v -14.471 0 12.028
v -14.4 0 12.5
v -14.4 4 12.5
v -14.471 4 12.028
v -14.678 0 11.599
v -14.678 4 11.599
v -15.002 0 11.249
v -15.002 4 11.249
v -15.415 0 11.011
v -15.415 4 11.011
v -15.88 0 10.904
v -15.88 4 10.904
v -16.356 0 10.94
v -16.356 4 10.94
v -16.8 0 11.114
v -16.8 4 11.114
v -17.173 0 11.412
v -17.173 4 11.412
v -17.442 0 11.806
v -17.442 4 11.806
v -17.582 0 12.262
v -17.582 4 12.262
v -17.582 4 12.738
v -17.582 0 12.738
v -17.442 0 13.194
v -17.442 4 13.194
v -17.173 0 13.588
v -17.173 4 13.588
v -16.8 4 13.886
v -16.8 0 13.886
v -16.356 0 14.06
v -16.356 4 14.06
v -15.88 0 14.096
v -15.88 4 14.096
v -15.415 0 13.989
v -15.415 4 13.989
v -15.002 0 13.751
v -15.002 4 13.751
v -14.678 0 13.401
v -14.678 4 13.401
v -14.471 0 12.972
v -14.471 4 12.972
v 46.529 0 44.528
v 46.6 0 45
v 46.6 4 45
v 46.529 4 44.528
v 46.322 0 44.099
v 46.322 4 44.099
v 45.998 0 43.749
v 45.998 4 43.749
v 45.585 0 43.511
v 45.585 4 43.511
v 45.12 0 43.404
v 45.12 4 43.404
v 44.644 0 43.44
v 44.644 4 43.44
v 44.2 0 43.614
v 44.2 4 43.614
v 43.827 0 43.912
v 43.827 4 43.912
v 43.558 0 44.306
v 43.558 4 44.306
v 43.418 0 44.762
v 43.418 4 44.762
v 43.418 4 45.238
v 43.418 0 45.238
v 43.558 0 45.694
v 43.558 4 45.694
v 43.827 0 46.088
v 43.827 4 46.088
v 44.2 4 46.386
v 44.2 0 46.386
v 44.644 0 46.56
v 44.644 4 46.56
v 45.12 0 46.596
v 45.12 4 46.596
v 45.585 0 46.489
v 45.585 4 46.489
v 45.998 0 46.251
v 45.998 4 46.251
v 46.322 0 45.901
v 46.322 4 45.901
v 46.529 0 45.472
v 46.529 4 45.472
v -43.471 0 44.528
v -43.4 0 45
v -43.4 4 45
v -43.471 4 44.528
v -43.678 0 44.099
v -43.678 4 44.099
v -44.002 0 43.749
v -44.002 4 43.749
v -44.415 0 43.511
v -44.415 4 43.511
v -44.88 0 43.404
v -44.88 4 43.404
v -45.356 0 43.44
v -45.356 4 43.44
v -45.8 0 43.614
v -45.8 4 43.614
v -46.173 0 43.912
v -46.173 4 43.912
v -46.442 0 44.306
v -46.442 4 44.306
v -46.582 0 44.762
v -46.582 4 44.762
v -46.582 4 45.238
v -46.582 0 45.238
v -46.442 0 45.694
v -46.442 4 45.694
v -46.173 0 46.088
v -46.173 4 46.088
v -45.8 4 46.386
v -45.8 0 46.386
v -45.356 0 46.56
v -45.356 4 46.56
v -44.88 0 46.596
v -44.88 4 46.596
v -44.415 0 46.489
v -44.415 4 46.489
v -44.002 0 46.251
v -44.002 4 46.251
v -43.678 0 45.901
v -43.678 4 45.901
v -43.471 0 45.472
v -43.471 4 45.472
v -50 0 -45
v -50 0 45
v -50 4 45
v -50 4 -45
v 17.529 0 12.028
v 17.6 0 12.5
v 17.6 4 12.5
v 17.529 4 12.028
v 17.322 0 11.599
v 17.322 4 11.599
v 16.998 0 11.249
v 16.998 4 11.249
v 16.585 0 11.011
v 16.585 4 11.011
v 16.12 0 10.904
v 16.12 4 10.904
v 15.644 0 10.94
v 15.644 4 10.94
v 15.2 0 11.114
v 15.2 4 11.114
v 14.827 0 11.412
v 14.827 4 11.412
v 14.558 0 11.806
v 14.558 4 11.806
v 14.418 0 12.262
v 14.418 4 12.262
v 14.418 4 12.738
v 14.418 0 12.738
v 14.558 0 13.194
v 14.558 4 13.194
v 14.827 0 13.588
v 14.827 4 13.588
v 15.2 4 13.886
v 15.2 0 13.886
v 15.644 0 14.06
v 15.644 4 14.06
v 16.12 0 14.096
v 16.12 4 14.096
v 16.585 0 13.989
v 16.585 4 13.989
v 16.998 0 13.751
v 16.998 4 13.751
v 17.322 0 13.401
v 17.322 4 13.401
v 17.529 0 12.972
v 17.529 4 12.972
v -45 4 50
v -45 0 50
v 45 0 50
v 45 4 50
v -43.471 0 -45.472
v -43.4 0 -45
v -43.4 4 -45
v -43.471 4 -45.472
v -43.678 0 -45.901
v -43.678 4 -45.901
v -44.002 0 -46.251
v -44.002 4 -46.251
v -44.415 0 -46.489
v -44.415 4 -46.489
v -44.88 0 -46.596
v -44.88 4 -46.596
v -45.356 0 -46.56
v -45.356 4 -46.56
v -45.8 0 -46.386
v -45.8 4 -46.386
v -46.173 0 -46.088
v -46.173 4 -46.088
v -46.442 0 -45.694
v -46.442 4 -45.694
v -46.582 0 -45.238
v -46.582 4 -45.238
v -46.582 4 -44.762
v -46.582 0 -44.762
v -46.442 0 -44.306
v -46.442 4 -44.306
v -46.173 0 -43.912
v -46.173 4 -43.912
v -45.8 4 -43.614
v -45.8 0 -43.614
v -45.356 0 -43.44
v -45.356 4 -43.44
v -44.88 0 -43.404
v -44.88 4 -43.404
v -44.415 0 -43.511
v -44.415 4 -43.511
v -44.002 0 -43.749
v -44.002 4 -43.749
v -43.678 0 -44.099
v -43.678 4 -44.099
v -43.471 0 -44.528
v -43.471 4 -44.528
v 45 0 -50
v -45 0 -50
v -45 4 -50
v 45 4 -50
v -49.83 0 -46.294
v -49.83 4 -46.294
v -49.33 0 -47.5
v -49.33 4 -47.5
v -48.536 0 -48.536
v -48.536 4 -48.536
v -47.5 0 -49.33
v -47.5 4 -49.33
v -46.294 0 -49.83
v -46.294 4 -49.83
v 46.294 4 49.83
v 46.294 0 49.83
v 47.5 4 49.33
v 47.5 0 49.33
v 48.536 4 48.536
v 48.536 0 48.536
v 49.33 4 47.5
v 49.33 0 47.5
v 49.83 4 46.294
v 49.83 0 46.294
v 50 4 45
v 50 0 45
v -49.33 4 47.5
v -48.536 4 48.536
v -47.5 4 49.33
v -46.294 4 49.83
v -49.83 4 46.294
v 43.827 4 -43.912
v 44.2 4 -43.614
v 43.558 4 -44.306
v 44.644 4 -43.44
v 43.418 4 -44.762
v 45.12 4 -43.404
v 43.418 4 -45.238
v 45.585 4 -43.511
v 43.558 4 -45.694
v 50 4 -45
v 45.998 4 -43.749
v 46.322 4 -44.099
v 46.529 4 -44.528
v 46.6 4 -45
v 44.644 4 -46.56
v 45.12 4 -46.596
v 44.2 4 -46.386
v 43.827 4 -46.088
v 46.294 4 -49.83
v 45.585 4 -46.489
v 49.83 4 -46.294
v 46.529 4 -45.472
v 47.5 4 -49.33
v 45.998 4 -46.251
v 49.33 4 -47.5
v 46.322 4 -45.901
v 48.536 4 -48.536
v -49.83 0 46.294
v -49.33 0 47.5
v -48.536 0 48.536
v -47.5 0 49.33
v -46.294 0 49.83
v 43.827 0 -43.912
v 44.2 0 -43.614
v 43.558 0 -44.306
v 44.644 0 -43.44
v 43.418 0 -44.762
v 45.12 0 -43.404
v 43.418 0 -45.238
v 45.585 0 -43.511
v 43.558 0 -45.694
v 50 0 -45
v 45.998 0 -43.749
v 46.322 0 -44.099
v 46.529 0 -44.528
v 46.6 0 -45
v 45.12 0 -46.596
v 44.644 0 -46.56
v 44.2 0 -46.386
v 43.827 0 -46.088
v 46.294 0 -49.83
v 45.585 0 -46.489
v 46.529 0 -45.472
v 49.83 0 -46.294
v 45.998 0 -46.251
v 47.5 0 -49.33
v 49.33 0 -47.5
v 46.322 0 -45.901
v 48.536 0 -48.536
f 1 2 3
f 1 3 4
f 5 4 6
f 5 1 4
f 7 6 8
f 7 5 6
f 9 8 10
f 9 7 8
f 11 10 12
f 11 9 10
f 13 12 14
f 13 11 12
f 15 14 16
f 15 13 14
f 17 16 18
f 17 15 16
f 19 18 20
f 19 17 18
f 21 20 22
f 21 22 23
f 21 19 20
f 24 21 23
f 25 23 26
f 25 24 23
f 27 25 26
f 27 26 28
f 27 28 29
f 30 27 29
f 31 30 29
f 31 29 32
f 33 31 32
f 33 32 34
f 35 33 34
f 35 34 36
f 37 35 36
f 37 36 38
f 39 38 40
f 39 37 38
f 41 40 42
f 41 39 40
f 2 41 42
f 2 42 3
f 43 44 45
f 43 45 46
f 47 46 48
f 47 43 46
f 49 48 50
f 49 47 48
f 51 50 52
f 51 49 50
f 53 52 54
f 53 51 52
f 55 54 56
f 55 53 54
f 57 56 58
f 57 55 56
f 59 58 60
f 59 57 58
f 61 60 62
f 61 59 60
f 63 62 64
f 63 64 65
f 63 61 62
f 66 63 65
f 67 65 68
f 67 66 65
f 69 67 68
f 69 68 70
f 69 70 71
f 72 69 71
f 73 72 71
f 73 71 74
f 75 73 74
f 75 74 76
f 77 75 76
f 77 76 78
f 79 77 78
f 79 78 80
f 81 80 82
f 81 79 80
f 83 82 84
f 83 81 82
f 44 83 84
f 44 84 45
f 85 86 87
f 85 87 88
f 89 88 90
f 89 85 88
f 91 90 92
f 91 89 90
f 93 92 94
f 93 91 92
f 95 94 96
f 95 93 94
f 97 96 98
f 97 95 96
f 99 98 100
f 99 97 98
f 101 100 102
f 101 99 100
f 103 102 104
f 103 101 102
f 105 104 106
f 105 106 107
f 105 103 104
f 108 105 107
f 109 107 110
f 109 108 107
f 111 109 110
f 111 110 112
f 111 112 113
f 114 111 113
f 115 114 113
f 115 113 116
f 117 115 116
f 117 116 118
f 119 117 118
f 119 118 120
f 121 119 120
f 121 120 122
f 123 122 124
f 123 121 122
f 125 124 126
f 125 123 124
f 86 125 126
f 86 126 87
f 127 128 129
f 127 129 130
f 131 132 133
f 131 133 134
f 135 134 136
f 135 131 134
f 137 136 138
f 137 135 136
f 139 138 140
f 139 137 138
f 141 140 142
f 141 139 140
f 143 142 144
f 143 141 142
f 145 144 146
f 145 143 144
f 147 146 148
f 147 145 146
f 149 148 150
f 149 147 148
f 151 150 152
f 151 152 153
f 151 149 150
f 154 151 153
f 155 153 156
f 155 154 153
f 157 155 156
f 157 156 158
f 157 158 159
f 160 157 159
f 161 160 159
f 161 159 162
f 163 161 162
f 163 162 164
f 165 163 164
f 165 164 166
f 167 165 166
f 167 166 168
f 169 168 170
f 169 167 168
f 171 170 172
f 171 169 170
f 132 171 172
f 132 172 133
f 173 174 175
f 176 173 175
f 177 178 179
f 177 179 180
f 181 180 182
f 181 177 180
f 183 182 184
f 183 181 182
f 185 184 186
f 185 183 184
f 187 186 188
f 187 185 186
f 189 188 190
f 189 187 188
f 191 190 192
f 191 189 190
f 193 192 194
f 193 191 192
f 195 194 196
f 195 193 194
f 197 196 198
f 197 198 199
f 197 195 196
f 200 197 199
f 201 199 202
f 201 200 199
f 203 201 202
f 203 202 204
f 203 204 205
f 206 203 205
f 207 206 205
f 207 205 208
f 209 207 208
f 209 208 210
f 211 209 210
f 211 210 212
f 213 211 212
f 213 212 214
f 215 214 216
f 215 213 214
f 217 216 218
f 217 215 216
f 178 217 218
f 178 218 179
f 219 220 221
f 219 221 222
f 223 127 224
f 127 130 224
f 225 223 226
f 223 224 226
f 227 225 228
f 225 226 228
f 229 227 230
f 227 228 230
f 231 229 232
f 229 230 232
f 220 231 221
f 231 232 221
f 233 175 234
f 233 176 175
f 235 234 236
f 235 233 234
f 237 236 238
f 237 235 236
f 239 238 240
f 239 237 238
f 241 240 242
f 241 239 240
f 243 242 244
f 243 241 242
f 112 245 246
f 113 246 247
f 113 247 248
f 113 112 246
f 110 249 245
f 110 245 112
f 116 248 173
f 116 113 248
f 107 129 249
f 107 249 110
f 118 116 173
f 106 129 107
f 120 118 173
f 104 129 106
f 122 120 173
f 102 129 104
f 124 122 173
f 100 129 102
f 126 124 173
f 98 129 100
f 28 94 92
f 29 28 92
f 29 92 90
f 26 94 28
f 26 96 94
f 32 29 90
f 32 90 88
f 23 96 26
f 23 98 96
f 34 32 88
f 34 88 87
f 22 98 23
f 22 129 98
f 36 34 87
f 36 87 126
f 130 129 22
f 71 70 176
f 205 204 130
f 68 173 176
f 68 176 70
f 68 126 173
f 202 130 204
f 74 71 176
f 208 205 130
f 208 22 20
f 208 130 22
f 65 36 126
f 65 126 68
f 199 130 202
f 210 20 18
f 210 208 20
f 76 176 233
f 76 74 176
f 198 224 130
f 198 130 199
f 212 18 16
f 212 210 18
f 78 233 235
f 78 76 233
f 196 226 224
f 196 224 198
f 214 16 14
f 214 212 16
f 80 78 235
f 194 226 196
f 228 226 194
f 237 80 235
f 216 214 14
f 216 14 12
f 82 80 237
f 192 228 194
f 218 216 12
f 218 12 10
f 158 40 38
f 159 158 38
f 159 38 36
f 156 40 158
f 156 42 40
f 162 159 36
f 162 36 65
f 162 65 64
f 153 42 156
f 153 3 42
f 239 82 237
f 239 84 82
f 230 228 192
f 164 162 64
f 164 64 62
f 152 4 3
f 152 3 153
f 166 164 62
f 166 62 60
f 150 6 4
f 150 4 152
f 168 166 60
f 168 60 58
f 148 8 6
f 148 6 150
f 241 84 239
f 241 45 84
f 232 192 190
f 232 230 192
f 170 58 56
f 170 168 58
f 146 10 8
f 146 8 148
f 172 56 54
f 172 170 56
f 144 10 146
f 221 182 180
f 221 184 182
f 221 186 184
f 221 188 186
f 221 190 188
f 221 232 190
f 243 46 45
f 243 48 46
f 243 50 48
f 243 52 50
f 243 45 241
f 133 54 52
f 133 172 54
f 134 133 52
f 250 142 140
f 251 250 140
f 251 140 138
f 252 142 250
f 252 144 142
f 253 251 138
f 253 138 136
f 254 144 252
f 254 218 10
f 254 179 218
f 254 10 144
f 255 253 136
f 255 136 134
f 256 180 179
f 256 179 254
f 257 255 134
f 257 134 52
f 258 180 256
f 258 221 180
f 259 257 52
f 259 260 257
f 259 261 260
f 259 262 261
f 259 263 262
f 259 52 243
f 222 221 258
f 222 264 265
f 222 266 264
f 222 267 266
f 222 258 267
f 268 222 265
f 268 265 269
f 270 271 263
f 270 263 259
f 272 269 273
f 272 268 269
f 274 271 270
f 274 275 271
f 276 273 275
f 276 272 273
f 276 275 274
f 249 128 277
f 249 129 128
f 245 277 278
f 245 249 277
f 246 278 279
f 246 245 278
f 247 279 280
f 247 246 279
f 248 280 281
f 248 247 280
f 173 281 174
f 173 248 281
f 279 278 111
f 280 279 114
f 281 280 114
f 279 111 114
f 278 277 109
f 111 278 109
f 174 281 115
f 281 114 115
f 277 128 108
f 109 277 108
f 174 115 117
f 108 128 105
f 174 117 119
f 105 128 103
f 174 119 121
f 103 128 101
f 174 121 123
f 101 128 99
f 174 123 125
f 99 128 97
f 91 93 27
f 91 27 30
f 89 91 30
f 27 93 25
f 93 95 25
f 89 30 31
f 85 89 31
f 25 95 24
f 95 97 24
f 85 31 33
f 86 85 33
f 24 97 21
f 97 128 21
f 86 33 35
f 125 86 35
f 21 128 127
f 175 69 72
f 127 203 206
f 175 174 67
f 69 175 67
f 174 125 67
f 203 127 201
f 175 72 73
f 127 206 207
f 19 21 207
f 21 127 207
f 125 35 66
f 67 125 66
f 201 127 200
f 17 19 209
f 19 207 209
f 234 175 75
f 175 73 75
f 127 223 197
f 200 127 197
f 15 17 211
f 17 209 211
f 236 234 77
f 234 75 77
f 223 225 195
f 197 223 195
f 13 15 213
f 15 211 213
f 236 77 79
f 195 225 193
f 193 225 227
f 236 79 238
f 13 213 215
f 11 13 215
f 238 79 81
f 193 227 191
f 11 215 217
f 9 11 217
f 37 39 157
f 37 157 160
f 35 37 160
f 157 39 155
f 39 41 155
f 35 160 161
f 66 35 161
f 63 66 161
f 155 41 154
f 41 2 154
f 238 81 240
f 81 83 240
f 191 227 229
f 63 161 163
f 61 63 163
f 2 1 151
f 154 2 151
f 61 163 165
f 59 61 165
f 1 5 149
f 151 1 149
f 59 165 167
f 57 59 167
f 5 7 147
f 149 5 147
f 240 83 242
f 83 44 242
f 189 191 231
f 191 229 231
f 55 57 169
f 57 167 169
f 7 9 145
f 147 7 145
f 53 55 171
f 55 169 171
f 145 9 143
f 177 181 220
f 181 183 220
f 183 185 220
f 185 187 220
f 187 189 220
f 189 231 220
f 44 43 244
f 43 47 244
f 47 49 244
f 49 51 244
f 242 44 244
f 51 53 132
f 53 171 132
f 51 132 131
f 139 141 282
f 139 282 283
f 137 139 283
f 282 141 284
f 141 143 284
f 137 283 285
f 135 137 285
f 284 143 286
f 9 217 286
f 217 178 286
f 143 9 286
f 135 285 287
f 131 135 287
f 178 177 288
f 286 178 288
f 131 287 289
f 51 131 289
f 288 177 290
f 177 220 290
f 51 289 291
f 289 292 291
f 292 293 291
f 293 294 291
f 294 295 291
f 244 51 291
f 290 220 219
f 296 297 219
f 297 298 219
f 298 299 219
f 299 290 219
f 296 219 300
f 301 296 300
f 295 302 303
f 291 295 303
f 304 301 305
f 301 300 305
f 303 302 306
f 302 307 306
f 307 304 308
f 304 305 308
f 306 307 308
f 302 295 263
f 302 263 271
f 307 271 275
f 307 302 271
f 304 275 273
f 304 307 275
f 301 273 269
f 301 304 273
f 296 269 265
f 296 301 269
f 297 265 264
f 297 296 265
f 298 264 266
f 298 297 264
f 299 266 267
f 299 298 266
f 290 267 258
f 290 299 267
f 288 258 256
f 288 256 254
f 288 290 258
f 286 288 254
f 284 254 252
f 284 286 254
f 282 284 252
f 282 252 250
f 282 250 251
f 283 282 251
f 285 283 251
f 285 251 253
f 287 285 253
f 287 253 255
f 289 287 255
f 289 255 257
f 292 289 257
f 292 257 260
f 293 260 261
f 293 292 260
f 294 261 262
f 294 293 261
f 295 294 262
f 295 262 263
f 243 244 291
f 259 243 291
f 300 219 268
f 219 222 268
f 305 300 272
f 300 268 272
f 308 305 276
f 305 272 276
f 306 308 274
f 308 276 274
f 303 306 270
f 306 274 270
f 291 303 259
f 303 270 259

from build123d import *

# Parameters (mm, degrees)
SKETCH1_W           = 100
SKETCH1_H           = 100
SKETCH1_R           = 1.6
BOSS_EXTRUDE1_DEPTH = 4
FILLET1_R           = 5


with BuildPart() as part:
    # Sketch1 → Boss-Extrude1 (new body)
    with BuildSketch(Plane(origin=(0, 0, 0), x_dir=(1, 0, 0), z_dir=(0, 1, 0))):
        Rectangle(SKETCH1_W, SKETCH1_H)
        with Locations((-45, 45)):
            Circle(SKETCH1_R, mode=Mode.SUBTRACT)
        with Locations((45, 45)):
            Circle(SKETCH1_R, mode=Mode.SUBTRACT)
        with Locations((45, -45)):
            Circle(SKETCH1_R, mode=Mode.SUBTRACT)
        with Locations((-45, -45)):
            Circle(SKETCH1_R, mode=Mode.SUBTRACT)
        with Locations((16, -12.5)):
            Circle(SKETCH1_R, mode=Mode.SUBTRACT)
        with Locations((-16, -12.5)):
            Circle(SKETCH1_R, mode=Mode.SUBTRACT)
    extrude(amount=BOSS_EXTRUDE1_DEPTH)

    # Fillet1
    fillet1_edges = [part.edges().sort_by_distance(p)[0] for p in [
        (-50, 2, -50),
        (50, 2, -50),
        (50, 2, 50),
        (-50, 2, 50),
    ]]
    fillet(fillet1_edges, radius=FILLET1_R)


solid = part.part
